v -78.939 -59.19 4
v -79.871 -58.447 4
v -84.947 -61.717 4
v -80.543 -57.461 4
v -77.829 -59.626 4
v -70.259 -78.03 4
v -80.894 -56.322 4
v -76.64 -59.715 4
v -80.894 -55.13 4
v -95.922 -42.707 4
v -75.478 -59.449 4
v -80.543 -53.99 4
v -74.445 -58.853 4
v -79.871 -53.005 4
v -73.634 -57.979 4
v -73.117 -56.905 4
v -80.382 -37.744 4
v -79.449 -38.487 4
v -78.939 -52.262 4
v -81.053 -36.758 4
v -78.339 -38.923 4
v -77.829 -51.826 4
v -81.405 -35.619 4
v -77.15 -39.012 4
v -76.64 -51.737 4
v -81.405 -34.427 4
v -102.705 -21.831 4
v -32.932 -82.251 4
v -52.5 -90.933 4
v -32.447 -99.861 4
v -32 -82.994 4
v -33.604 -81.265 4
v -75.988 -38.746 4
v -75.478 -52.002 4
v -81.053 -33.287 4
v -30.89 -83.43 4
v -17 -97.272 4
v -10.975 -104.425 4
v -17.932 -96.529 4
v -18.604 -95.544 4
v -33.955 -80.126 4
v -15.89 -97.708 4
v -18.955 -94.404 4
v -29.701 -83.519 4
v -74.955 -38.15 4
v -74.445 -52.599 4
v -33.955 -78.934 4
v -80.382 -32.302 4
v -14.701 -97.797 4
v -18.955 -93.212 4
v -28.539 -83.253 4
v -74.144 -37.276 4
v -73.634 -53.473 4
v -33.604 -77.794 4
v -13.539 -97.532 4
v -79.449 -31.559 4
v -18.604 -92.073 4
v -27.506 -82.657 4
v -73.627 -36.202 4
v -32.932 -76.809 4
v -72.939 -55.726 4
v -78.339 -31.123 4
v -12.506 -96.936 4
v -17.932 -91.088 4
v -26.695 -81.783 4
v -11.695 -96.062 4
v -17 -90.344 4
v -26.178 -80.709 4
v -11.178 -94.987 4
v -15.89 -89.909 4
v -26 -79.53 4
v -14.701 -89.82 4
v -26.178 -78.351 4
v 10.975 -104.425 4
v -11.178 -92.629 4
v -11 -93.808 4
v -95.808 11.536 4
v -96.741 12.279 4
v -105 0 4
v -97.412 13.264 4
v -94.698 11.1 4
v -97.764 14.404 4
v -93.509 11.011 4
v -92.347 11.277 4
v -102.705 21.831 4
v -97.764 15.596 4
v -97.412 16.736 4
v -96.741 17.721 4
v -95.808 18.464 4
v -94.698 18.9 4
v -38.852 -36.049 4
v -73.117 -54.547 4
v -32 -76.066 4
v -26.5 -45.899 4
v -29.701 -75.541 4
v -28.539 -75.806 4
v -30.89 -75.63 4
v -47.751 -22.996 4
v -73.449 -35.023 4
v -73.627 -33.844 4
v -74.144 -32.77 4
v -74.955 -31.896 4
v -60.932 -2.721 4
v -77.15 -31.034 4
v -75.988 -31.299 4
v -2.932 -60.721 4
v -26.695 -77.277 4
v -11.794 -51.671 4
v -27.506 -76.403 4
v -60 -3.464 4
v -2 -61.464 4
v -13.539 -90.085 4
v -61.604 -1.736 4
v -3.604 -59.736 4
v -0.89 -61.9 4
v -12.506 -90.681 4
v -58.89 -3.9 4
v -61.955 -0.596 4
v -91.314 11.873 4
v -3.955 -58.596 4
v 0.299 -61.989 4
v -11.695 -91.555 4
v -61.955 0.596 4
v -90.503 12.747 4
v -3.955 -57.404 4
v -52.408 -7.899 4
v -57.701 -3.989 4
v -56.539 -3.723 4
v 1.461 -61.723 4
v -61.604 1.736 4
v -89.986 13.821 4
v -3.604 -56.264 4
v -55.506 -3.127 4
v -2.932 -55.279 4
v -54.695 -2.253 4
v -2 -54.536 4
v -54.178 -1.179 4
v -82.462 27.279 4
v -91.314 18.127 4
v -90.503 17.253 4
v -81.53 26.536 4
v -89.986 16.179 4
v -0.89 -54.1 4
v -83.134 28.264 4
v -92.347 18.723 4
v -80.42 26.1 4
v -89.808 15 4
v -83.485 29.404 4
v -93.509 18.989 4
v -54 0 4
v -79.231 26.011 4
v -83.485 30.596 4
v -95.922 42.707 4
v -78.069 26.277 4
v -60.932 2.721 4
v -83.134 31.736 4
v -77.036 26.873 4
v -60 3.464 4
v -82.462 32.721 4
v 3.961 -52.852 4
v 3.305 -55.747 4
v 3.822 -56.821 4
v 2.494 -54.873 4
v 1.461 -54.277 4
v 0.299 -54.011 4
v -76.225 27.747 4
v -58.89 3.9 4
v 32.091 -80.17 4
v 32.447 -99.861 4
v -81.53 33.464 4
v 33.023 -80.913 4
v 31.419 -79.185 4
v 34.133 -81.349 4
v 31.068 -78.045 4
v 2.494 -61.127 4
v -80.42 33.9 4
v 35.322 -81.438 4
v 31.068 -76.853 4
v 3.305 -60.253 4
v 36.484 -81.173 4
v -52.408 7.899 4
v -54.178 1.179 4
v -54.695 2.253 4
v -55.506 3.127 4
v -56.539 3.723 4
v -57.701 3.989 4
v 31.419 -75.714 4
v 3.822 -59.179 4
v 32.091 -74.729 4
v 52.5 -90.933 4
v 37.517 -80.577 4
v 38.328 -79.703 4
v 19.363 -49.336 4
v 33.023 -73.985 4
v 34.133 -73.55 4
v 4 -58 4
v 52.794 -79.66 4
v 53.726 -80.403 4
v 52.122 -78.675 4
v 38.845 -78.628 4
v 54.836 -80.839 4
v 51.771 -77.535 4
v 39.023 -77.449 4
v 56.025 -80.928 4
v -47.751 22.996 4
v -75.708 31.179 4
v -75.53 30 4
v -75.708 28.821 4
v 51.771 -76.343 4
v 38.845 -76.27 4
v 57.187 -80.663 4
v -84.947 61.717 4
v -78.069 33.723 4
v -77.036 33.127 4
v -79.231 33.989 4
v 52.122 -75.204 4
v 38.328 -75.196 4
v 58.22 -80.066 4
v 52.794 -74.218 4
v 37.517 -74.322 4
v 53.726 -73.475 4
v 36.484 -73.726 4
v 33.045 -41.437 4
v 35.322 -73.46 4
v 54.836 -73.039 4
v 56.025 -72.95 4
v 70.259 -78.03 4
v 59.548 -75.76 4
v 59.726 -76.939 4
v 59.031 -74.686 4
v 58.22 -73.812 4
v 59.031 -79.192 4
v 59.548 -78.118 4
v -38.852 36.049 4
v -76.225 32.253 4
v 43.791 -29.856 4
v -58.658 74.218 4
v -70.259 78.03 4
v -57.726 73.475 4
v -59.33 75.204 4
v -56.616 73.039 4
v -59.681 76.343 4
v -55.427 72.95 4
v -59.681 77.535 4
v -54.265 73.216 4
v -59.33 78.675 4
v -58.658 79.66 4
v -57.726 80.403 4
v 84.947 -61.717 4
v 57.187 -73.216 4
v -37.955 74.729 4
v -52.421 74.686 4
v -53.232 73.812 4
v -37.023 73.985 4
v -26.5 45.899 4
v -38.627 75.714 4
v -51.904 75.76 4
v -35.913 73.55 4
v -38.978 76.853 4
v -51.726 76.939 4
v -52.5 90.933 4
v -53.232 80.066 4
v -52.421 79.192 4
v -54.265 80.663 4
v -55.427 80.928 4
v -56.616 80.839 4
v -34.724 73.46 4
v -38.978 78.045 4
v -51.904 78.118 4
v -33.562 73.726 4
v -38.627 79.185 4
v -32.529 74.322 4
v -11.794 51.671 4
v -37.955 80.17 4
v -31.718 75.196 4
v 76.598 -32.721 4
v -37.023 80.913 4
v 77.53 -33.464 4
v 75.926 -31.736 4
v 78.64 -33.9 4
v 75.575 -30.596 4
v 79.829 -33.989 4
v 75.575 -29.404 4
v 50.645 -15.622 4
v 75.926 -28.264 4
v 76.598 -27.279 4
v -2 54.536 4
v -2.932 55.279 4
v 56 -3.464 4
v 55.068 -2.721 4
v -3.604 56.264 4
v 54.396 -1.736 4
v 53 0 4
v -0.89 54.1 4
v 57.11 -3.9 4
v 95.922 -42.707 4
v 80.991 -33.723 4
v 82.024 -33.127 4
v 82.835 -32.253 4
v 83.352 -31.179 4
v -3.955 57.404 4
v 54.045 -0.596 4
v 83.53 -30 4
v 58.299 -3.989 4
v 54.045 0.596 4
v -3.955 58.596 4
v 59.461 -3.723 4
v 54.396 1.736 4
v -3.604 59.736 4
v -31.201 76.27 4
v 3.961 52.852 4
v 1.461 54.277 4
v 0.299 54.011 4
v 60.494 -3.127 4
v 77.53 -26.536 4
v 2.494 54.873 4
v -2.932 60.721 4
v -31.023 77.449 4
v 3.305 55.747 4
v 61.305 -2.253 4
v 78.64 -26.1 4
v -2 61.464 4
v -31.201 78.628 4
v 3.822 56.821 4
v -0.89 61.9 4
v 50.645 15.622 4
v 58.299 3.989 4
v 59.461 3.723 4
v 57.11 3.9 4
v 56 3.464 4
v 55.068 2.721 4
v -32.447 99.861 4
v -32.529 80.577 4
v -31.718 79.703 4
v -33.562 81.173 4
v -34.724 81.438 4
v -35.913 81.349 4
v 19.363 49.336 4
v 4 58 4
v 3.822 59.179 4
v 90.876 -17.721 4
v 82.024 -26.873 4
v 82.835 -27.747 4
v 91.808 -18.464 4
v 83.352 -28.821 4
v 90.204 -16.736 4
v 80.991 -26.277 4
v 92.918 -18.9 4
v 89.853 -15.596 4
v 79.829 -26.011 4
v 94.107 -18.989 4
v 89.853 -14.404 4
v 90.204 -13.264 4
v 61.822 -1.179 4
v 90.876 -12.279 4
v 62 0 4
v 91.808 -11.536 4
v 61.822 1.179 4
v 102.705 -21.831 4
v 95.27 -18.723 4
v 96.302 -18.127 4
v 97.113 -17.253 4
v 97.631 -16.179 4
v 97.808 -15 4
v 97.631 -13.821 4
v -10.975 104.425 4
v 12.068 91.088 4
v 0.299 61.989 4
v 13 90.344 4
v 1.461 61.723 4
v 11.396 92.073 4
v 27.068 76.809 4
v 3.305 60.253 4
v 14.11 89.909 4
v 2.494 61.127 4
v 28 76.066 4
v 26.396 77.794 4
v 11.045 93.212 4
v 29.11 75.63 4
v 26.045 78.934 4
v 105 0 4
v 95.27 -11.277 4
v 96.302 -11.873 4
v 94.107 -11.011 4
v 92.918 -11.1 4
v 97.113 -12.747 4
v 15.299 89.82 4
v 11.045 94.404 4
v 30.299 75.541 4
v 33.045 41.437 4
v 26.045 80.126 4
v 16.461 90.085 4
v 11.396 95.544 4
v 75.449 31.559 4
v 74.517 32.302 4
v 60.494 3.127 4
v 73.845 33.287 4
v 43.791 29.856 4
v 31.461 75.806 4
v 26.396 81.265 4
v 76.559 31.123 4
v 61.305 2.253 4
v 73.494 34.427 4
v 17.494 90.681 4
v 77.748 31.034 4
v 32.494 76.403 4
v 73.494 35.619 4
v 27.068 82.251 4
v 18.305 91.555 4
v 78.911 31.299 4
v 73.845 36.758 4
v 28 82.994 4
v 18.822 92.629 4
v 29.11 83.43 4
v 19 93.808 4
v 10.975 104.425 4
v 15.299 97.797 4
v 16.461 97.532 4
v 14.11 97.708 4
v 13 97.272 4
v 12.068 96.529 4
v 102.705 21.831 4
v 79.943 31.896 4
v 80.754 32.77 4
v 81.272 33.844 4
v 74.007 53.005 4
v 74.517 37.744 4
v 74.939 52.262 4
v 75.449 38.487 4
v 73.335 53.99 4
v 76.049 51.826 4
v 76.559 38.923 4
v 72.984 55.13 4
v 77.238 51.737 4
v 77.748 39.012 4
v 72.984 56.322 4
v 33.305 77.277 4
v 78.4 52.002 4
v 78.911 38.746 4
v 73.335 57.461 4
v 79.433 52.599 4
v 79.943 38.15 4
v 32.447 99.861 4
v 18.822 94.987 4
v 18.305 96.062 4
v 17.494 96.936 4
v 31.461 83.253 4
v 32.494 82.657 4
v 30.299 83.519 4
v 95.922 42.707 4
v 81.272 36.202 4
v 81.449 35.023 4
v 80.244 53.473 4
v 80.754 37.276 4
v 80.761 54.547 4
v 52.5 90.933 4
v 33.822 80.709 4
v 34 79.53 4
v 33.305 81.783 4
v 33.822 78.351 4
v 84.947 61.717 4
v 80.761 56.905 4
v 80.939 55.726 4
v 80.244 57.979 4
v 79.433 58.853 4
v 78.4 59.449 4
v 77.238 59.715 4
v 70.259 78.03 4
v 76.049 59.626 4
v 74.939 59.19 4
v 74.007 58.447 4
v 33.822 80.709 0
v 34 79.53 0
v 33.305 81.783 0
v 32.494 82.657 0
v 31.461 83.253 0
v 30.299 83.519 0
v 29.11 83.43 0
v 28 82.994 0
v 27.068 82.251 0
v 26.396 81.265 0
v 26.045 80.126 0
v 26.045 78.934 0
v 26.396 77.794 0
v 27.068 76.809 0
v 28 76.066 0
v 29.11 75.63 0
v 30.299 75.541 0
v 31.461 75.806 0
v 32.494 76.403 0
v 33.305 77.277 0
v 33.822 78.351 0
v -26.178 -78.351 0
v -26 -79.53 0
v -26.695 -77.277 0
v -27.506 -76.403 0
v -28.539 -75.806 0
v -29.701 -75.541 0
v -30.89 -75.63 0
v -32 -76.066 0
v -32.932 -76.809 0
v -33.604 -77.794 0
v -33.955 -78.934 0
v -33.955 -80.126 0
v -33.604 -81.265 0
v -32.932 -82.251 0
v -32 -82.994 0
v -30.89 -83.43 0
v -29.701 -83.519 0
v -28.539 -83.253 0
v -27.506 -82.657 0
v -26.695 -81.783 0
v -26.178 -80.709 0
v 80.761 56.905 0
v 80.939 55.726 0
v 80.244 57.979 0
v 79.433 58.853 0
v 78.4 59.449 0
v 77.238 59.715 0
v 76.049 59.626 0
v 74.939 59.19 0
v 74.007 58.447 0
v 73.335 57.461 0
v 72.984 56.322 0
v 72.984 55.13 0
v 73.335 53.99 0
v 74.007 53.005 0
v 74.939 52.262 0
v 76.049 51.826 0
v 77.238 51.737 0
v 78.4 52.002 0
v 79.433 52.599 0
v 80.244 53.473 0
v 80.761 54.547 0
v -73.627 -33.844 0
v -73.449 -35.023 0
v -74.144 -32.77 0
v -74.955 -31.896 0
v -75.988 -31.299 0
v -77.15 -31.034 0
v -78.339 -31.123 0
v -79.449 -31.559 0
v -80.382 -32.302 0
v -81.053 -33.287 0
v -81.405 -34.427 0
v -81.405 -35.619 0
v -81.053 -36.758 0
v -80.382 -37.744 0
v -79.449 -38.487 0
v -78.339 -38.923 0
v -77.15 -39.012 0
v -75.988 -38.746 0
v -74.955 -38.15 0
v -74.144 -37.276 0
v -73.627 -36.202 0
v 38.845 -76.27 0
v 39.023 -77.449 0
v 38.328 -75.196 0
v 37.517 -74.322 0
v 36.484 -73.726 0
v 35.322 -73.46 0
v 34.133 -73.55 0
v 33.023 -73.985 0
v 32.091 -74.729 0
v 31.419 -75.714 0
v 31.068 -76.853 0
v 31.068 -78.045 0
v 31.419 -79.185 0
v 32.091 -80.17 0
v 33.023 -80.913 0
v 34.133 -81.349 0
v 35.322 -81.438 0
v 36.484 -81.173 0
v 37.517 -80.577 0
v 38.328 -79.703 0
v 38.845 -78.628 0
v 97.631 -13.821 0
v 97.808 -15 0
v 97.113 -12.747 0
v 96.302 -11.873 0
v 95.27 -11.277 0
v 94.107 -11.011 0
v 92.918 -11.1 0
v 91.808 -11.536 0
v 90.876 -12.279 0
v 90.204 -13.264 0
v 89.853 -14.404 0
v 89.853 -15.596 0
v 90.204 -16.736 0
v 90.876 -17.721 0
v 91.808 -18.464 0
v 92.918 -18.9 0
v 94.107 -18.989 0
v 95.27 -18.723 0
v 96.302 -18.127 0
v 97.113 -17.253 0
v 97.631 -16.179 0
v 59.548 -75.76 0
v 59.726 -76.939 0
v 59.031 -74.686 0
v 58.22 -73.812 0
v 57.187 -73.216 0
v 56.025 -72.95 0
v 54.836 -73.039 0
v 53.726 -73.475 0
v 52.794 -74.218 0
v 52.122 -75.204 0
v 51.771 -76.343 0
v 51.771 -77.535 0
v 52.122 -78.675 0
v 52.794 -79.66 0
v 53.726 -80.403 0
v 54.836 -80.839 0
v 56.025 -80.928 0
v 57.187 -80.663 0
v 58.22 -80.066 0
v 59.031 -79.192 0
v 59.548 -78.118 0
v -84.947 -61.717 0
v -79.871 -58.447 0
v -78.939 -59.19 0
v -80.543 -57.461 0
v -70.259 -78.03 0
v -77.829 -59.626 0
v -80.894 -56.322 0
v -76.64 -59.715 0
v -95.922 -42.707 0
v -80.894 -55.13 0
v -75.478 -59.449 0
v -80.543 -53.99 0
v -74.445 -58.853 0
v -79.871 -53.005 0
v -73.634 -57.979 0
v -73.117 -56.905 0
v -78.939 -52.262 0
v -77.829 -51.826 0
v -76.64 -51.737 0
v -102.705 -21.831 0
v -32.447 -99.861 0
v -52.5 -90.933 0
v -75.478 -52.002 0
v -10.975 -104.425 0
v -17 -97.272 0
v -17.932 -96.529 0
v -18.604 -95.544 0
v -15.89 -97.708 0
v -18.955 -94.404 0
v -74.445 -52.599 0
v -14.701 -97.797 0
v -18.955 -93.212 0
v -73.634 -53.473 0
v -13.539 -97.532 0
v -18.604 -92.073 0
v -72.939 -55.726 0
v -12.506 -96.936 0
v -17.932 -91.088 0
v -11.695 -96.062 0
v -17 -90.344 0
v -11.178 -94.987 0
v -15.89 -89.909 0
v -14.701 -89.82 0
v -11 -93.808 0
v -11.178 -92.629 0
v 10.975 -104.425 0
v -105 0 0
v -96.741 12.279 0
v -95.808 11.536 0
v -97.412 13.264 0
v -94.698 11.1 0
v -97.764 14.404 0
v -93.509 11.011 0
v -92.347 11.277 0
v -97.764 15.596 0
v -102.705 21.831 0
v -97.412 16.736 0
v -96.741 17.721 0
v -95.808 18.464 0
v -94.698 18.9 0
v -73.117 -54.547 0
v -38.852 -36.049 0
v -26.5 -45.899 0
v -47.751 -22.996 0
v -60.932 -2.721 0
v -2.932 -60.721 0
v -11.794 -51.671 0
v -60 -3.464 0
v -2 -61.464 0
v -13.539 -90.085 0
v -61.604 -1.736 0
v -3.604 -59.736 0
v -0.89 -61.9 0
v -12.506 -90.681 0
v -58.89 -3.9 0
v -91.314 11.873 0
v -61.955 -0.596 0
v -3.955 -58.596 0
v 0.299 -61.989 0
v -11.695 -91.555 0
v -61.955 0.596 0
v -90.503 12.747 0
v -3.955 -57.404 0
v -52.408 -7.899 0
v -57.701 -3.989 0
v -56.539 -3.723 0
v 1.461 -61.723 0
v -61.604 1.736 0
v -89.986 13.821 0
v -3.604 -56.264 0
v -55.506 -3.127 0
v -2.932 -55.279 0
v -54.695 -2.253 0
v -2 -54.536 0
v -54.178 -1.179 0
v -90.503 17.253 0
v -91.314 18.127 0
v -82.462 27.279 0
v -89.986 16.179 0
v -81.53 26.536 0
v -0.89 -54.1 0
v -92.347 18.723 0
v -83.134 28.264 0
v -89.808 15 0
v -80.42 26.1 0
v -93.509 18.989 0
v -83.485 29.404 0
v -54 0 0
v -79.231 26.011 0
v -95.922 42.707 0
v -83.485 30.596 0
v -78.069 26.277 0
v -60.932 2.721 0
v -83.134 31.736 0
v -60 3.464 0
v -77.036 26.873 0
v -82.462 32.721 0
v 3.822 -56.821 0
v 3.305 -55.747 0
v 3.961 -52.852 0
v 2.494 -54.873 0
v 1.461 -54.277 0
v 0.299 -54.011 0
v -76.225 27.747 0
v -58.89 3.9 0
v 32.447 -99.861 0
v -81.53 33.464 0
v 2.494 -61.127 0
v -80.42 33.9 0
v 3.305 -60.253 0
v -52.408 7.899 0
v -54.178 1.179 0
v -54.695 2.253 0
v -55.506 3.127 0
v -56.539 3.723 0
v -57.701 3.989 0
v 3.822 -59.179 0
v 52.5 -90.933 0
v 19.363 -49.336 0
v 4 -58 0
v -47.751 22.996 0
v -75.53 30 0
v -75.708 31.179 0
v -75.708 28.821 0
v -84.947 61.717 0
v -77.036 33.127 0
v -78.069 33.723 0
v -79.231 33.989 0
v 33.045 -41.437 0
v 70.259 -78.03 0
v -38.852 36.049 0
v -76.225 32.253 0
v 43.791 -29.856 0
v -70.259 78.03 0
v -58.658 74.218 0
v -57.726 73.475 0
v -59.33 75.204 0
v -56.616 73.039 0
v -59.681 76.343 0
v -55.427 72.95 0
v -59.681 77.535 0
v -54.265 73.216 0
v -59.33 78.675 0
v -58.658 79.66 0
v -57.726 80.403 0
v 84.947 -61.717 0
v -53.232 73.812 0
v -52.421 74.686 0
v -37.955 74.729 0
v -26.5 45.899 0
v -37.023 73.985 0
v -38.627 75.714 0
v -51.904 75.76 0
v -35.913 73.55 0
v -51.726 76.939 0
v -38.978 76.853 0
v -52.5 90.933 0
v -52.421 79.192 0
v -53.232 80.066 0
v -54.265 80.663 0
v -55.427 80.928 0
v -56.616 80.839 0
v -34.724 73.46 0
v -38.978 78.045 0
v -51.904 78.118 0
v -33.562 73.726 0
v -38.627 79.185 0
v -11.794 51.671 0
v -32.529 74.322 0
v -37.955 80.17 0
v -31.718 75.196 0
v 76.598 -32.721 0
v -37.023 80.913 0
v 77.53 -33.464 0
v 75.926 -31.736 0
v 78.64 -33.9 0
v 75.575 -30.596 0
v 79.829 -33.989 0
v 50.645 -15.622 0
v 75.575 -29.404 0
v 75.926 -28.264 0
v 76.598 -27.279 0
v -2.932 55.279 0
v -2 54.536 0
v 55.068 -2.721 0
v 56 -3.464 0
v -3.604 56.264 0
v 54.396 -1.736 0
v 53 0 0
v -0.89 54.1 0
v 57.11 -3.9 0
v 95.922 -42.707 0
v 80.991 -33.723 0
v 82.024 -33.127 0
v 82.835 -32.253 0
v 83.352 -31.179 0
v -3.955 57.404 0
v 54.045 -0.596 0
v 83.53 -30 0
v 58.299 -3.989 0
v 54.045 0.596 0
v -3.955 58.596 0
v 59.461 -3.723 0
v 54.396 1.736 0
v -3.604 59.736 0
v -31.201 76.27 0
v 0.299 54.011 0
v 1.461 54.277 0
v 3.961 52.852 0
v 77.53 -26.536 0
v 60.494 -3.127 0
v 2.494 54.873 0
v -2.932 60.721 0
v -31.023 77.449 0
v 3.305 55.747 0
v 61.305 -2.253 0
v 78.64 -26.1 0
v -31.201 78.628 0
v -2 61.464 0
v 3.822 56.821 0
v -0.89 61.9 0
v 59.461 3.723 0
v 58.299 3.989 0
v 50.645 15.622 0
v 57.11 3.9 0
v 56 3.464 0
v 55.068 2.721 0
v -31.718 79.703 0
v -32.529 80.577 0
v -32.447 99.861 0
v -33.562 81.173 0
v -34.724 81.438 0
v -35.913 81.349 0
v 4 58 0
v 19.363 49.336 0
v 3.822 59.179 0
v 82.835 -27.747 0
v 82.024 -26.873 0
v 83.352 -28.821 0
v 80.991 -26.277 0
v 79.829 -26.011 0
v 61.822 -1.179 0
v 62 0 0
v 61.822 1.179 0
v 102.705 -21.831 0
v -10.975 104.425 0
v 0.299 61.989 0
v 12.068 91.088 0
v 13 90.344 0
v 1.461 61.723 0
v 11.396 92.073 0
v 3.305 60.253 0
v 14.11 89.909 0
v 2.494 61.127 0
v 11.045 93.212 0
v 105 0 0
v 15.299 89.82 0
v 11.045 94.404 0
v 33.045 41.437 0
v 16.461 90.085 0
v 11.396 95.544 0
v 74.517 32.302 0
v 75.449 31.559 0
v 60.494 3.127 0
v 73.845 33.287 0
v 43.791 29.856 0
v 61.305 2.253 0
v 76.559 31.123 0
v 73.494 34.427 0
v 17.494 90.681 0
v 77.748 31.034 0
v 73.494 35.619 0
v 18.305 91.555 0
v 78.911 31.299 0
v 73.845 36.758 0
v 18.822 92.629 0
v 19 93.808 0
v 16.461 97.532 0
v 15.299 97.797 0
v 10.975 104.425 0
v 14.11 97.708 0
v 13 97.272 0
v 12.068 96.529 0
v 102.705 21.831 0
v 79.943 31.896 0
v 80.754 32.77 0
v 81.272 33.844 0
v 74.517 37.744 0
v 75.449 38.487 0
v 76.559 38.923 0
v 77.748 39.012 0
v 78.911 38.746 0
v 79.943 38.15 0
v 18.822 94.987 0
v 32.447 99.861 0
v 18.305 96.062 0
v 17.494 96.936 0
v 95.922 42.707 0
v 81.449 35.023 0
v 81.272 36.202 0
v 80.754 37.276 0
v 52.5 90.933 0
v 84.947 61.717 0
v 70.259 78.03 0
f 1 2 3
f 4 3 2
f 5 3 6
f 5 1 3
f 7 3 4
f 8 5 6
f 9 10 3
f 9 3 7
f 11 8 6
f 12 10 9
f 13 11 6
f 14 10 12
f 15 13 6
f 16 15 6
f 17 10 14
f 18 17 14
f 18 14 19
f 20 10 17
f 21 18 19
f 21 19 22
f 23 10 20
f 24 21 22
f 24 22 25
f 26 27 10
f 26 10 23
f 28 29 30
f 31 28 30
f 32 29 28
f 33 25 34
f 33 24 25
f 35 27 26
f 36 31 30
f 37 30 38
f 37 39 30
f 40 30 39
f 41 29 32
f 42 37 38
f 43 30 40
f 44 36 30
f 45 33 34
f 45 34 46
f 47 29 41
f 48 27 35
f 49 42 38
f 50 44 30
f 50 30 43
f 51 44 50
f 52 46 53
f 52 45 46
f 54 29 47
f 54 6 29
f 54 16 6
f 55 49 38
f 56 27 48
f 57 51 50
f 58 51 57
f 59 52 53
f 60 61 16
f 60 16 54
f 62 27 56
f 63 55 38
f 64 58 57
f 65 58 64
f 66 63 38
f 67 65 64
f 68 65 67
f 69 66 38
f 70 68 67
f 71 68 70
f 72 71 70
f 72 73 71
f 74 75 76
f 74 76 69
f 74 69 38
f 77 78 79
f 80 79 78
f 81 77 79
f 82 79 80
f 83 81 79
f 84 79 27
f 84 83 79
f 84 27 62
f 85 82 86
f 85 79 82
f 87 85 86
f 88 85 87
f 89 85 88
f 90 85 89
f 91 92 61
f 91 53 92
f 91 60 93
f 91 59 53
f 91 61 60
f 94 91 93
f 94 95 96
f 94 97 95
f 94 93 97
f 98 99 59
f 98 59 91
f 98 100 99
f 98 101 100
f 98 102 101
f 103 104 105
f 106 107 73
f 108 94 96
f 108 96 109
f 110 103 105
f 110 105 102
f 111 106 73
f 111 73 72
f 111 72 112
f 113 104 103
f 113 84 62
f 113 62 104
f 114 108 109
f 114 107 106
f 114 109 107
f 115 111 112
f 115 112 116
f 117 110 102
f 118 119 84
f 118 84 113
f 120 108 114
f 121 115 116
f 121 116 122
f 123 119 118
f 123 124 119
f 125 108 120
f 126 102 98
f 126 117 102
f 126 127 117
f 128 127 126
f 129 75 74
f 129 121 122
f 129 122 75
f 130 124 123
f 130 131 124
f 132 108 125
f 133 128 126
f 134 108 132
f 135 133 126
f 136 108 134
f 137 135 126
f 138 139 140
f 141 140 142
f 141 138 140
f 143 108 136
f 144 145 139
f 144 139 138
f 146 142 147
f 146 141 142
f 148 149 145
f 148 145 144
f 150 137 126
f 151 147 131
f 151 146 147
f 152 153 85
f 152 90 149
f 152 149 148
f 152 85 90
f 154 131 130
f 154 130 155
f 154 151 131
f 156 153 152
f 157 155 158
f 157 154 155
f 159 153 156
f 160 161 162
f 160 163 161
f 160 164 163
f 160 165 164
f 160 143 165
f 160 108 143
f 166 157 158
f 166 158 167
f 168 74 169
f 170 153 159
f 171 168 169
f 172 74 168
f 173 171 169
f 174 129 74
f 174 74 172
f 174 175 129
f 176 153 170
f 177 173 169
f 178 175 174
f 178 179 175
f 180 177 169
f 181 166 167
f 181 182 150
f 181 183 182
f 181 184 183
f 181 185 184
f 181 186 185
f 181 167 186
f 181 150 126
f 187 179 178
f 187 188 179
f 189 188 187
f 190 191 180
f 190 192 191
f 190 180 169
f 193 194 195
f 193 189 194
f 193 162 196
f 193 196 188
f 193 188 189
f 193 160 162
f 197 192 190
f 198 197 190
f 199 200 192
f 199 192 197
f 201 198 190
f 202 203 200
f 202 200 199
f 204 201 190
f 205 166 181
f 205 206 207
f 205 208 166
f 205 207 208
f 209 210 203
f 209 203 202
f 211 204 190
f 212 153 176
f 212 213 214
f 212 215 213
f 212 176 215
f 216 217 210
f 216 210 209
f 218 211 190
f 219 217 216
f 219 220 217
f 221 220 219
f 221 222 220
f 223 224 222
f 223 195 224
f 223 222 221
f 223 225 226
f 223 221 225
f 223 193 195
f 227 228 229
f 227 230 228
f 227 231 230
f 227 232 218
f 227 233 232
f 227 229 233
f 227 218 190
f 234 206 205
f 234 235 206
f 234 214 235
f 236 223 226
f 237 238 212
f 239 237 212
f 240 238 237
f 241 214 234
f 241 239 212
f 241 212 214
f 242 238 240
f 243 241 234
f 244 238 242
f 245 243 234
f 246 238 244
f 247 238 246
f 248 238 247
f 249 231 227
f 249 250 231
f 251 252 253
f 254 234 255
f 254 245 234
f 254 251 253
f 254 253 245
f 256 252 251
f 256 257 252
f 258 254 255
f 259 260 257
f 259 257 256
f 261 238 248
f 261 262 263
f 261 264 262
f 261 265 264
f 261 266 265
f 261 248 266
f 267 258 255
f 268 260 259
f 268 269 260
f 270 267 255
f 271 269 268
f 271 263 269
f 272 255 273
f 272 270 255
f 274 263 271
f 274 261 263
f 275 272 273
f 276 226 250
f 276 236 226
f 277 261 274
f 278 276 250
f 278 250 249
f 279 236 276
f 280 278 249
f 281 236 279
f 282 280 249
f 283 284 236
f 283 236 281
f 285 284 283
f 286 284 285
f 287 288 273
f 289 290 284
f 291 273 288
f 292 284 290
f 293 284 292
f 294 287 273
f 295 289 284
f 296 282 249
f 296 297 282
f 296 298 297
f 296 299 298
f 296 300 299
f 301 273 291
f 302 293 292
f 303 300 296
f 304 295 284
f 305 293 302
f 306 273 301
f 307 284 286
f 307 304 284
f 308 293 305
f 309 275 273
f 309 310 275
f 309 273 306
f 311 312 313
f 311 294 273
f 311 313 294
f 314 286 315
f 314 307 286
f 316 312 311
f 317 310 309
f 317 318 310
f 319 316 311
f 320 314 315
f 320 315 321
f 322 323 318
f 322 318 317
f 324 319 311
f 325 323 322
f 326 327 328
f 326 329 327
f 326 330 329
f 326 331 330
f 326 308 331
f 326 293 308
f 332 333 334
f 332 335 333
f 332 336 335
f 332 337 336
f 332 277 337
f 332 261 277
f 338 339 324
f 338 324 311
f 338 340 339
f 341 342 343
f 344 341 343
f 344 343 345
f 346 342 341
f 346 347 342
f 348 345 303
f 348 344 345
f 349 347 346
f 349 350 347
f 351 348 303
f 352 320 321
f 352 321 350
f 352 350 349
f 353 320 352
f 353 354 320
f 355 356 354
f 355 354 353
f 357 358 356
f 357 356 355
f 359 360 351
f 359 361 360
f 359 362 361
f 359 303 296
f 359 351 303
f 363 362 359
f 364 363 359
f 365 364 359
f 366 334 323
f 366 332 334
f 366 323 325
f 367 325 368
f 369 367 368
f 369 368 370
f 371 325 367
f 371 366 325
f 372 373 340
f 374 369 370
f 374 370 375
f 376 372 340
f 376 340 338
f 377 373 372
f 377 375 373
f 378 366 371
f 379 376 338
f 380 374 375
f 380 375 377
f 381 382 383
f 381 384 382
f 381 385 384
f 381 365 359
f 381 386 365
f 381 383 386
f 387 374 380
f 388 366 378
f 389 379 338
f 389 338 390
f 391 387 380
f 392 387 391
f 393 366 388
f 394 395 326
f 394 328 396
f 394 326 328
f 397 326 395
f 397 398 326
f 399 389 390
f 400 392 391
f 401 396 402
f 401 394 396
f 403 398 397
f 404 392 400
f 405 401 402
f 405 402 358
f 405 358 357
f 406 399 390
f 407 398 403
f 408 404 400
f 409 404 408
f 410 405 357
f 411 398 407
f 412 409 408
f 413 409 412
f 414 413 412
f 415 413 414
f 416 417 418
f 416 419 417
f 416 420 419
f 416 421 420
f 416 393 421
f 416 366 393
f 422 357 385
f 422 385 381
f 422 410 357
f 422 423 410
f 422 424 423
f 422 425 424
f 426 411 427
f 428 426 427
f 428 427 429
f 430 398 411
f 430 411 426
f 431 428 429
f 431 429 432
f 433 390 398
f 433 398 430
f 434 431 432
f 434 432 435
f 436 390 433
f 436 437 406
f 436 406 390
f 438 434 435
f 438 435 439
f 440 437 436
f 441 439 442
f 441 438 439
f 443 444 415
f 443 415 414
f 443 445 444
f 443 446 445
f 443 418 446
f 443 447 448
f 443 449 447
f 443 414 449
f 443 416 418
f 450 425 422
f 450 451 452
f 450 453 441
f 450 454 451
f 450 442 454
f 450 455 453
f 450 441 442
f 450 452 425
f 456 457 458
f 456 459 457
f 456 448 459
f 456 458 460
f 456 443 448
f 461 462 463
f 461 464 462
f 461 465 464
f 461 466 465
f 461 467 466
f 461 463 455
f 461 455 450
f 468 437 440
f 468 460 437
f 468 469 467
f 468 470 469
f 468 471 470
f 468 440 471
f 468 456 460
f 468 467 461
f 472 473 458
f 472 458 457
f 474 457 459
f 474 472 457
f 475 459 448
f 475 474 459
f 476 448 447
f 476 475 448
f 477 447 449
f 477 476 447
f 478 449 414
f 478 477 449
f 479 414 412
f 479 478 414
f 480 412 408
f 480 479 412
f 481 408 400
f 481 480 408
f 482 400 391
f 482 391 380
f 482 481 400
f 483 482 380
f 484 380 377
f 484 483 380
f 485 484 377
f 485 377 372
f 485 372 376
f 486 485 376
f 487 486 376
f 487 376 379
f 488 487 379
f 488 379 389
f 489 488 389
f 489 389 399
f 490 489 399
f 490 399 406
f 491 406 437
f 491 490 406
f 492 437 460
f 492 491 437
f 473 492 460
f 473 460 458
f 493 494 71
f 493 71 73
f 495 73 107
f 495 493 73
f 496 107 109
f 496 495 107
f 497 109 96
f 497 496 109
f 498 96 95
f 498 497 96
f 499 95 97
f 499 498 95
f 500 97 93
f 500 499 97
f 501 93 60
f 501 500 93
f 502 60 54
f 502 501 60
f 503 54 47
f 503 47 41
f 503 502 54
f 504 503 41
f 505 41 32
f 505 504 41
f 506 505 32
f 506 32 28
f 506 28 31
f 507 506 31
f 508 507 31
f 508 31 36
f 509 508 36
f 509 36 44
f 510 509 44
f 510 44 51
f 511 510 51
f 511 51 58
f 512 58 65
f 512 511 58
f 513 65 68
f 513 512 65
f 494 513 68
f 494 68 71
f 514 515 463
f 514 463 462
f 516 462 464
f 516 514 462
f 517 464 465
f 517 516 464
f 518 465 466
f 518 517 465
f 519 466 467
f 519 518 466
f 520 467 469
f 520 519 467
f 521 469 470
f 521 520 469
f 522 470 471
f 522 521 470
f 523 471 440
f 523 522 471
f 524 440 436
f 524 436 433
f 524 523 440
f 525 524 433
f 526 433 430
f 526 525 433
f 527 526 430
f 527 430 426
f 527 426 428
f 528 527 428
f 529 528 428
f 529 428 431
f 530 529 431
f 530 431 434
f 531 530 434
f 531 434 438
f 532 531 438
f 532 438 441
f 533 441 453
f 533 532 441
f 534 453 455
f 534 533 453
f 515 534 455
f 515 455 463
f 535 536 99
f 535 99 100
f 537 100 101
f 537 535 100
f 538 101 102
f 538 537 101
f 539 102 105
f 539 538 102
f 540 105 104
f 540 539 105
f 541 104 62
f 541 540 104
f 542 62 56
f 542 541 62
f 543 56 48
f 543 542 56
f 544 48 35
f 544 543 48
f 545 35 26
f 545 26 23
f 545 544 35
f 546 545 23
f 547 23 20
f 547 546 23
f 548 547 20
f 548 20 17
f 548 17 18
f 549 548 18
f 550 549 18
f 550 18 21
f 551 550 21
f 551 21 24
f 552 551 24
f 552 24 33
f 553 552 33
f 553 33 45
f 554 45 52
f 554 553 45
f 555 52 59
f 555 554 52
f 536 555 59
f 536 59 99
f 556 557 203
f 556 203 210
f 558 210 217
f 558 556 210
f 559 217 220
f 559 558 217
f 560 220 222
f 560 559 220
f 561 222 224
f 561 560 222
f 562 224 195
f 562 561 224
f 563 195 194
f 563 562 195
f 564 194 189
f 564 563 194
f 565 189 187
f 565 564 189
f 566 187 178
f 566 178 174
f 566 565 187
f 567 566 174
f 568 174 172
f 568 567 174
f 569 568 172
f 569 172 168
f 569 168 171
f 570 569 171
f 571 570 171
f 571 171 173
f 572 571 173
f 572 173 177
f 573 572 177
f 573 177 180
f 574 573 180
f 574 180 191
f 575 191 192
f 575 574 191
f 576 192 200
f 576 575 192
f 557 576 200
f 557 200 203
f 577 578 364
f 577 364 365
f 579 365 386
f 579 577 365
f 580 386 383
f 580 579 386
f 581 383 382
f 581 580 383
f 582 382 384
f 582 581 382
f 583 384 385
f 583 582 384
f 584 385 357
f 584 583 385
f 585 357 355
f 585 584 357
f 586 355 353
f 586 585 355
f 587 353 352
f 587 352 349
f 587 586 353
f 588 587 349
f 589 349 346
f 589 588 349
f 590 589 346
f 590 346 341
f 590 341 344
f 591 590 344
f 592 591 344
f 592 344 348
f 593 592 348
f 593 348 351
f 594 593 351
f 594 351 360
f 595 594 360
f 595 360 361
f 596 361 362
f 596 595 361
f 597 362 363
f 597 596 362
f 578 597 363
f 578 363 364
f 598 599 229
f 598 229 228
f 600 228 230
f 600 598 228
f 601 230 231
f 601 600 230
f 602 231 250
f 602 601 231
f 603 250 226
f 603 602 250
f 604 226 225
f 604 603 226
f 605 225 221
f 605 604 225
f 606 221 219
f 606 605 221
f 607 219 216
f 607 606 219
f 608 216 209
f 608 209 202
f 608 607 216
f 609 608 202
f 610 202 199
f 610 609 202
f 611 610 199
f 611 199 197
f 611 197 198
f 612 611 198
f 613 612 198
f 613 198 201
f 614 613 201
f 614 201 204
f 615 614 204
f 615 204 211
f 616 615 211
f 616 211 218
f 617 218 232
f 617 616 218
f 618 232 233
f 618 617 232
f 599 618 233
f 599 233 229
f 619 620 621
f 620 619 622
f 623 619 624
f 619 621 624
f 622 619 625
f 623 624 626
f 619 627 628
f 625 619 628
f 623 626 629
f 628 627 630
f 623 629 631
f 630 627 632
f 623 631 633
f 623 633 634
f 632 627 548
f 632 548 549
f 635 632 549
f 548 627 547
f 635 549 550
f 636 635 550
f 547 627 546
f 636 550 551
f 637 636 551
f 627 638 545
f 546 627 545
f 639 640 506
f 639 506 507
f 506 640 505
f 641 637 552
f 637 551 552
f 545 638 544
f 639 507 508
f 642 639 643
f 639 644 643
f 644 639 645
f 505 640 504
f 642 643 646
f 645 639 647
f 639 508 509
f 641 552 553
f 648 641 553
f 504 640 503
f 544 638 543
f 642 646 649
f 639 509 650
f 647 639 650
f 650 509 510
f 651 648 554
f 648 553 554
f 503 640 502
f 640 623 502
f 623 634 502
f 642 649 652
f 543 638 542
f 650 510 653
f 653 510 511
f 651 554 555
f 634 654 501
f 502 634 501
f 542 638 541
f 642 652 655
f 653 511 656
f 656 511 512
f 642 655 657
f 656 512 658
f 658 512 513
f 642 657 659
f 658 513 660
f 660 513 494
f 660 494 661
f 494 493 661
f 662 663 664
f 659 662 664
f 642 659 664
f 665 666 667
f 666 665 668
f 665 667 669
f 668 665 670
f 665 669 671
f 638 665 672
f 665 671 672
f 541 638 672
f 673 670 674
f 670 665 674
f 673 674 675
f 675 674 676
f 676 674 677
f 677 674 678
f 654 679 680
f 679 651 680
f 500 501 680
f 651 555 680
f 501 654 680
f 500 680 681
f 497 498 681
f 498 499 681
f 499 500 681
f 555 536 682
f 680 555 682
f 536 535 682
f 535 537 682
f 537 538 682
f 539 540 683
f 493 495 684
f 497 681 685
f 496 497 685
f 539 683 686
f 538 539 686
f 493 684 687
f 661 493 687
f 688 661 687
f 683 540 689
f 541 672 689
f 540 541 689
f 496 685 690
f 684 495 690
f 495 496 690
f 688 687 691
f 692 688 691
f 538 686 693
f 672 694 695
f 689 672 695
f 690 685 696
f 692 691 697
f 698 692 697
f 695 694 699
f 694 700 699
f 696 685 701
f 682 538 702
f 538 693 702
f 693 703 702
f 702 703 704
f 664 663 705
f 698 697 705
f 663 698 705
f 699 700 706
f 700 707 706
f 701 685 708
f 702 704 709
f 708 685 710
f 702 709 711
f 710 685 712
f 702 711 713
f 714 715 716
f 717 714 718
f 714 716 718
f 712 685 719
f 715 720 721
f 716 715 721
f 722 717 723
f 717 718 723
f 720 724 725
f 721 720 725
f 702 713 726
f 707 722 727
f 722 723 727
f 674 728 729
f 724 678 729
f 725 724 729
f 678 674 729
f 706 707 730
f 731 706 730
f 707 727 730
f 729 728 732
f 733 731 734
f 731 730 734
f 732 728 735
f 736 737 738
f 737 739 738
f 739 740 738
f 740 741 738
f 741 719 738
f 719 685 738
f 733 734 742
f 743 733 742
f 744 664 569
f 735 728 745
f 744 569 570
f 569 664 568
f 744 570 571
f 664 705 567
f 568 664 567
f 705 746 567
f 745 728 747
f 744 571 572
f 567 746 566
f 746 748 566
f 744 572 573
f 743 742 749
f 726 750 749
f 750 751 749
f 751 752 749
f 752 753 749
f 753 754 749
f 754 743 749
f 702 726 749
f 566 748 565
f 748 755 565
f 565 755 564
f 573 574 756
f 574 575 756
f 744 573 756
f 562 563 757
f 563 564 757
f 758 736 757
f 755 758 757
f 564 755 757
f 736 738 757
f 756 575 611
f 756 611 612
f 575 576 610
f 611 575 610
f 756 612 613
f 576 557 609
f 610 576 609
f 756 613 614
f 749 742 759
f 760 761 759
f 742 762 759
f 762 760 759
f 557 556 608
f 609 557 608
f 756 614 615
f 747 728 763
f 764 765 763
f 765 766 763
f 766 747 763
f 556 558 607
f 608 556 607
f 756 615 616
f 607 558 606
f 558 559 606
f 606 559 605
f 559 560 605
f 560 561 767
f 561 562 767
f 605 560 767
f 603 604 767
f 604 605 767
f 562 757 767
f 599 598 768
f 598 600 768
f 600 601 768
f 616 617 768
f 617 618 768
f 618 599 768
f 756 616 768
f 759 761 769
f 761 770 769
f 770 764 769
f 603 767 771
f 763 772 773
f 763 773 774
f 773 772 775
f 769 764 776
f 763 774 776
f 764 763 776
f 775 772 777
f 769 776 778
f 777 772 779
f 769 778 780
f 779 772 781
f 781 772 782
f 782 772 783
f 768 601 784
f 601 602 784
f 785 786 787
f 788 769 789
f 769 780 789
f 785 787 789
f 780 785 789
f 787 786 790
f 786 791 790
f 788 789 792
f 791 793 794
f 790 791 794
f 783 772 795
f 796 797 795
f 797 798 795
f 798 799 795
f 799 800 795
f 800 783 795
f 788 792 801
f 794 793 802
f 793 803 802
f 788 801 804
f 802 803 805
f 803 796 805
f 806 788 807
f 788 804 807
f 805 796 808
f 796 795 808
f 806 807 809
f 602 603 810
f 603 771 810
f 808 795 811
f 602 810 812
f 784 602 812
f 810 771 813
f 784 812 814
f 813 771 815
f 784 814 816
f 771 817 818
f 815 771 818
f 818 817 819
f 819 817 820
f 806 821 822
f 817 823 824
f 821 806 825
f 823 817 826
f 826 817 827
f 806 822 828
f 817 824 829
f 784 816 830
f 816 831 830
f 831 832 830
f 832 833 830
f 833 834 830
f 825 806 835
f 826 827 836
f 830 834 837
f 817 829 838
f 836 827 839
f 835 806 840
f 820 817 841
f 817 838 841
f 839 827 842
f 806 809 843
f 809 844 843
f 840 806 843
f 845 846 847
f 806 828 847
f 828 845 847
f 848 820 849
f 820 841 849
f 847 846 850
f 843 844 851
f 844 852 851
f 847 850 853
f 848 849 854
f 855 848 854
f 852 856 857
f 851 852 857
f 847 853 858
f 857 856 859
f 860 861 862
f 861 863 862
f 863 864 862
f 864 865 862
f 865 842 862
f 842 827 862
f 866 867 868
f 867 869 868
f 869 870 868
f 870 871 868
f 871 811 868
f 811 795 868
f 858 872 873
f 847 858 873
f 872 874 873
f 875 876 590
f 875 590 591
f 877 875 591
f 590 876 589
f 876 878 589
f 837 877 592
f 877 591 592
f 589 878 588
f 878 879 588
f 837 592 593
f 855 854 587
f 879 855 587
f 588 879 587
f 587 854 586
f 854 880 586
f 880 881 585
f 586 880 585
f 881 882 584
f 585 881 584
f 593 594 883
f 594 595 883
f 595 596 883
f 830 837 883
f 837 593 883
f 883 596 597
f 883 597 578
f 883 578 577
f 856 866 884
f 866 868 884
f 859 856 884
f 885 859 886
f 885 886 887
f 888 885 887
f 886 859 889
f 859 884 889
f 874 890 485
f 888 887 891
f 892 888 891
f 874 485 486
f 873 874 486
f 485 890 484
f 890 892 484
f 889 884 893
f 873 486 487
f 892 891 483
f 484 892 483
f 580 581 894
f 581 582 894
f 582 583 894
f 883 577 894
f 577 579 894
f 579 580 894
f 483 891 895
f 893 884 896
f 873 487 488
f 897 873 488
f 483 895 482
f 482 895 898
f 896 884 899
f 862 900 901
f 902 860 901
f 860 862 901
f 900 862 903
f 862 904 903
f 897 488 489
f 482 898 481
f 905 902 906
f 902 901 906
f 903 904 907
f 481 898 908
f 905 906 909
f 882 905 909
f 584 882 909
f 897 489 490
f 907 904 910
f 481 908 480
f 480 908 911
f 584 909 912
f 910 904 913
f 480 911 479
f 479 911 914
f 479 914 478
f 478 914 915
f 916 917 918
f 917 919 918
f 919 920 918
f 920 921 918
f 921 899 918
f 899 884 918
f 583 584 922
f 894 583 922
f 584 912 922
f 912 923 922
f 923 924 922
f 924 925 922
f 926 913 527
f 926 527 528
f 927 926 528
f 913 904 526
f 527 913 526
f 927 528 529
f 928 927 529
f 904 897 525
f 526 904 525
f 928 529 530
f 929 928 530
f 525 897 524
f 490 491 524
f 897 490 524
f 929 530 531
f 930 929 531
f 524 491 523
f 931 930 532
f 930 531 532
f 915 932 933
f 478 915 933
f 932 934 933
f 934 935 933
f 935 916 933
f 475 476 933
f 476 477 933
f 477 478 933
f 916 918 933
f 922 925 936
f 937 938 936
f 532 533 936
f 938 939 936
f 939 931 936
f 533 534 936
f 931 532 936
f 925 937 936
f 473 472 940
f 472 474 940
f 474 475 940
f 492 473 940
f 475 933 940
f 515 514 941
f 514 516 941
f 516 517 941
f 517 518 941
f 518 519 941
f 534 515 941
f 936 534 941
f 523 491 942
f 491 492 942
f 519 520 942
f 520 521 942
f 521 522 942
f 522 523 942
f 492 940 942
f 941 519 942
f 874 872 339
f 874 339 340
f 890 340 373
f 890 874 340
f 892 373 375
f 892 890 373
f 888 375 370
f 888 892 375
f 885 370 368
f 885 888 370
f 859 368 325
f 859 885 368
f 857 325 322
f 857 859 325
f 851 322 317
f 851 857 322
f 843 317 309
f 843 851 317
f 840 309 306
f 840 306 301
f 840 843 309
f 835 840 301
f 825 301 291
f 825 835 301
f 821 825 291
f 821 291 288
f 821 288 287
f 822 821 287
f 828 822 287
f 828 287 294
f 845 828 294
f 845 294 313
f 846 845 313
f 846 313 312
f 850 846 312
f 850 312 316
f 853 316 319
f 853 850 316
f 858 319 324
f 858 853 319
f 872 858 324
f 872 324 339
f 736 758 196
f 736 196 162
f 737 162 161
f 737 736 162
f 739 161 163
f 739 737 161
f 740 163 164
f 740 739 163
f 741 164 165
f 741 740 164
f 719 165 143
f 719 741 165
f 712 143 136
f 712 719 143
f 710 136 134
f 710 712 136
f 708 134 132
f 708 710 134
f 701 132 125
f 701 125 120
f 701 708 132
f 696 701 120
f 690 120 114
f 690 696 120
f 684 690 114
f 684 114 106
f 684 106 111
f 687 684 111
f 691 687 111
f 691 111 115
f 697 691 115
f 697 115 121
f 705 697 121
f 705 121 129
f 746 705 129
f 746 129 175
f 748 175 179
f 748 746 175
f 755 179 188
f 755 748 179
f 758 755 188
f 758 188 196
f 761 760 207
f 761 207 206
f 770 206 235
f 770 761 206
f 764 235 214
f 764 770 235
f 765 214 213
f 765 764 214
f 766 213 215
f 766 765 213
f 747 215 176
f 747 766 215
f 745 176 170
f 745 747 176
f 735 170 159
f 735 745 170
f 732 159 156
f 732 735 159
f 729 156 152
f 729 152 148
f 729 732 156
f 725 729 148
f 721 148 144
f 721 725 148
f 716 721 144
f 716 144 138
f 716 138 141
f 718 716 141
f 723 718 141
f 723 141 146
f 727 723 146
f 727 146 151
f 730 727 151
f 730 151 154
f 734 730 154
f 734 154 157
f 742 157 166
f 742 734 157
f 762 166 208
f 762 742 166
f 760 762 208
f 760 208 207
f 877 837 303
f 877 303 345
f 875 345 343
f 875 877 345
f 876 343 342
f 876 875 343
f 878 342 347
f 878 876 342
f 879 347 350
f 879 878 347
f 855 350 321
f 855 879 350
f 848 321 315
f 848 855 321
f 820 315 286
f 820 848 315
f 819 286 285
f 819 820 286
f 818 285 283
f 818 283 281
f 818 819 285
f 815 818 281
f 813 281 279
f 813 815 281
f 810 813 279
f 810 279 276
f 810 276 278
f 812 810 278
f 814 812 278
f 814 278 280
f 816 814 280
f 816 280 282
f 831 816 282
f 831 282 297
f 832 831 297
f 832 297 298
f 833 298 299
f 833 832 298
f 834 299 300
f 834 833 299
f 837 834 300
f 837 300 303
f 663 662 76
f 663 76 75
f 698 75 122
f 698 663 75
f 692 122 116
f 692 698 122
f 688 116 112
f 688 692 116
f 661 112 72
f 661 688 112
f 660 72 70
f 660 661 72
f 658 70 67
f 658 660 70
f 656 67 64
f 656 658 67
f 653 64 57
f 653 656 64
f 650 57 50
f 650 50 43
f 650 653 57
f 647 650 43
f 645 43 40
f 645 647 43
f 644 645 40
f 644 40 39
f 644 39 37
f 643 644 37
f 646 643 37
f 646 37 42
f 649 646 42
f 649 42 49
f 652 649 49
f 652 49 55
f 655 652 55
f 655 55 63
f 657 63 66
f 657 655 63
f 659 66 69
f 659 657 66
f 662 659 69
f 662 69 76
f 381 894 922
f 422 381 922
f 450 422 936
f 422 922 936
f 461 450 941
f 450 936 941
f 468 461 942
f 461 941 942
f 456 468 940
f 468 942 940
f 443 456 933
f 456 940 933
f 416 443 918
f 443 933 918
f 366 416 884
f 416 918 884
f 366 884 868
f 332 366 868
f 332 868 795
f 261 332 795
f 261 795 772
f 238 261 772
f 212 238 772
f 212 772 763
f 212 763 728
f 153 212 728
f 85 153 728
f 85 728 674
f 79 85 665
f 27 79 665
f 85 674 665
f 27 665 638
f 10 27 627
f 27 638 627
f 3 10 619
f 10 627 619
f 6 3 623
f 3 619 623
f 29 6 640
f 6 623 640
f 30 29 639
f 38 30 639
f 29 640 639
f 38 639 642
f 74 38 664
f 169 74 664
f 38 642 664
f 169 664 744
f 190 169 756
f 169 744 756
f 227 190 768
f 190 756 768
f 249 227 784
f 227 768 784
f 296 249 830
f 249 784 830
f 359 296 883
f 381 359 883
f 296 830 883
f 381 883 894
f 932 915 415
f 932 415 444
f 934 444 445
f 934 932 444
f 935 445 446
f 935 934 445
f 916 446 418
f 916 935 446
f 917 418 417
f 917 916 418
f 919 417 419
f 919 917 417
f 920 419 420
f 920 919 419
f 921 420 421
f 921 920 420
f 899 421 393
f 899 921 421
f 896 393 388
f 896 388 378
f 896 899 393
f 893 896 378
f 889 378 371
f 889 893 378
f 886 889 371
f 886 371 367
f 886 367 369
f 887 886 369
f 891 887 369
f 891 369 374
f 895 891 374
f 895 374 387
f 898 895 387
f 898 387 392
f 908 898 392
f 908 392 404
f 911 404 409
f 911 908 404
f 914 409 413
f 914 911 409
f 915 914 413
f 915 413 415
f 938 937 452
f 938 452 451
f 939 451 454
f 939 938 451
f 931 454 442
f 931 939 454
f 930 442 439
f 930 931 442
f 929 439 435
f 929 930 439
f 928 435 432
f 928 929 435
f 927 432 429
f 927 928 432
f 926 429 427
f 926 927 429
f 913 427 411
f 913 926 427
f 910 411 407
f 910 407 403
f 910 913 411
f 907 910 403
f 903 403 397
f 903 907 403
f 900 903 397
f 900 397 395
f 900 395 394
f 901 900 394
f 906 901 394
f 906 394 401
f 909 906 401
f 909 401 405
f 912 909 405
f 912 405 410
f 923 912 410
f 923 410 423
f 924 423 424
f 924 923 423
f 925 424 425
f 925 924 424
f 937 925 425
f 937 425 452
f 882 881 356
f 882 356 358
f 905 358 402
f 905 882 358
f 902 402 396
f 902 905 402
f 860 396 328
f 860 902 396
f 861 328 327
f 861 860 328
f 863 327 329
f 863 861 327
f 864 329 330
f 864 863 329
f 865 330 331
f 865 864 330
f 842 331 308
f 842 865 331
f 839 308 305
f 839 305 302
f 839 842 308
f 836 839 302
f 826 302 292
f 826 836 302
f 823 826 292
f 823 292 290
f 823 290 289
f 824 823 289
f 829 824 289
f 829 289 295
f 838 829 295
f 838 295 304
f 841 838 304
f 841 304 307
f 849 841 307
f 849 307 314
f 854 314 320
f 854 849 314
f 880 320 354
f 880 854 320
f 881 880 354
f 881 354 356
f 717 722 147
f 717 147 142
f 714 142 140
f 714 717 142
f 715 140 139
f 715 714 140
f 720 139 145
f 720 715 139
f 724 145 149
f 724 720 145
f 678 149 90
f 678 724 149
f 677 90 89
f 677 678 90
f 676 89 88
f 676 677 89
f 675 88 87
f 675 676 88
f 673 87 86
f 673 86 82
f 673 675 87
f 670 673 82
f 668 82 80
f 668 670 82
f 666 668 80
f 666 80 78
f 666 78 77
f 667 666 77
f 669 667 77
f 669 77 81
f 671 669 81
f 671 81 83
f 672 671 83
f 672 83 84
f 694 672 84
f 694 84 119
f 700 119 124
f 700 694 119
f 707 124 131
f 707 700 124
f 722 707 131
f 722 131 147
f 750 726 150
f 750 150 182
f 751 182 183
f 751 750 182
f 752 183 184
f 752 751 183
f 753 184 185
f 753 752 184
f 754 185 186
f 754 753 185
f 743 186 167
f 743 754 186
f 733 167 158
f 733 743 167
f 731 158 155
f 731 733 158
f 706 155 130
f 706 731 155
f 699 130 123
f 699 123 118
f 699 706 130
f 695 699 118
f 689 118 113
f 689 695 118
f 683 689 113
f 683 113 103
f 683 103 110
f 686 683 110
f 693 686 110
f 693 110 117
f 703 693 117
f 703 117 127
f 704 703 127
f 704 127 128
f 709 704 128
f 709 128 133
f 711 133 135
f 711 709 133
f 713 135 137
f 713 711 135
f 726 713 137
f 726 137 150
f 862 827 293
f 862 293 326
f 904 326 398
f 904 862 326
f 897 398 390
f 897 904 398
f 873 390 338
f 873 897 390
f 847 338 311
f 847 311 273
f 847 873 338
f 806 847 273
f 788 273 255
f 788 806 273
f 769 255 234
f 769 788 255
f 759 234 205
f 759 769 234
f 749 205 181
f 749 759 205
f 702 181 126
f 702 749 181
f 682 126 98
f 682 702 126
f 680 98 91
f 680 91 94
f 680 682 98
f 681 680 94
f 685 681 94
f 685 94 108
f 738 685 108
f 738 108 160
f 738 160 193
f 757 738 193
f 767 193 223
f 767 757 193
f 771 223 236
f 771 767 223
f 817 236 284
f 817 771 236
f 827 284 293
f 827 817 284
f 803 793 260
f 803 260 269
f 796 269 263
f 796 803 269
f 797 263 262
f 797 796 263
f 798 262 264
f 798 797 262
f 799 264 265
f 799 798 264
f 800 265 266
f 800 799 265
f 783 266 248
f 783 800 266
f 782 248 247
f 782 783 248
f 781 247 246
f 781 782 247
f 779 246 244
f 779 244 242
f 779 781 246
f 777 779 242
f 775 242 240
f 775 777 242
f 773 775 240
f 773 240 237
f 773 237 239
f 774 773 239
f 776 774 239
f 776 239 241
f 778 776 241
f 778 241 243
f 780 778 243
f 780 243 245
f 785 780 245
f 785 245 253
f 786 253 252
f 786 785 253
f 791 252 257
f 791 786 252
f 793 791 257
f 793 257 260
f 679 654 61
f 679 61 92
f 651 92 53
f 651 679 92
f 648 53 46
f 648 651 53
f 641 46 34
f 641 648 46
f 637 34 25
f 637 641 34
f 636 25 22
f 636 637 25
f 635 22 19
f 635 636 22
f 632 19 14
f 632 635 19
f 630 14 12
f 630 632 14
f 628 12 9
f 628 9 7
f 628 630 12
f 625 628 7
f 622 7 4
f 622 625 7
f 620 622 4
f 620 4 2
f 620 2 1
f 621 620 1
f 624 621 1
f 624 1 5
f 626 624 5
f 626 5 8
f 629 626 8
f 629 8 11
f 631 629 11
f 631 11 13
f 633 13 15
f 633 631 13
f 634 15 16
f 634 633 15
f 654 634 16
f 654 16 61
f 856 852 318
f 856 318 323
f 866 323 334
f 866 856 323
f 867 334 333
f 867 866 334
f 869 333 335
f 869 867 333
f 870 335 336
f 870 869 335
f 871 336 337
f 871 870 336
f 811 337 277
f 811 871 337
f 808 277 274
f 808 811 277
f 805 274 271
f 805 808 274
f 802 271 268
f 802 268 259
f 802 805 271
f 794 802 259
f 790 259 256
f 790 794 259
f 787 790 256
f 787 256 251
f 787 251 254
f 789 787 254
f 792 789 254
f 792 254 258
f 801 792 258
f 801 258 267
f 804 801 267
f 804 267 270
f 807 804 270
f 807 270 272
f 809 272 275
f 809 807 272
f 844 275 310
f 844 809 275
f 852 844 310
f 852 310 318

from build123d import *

# Parameters (mm, degrees)
SKETCH1_R           = 105
SKETCH1_R_2         = 53
SKETCH1_R_3         = 4
BOSS_EXTRUDE1_DEPTH = 4


with BuildPart() as part:
    # Sketch1 → Boss-Extrude1 (new body)
    with BuildSketch(Plane.XY):
        Circle(SKETCH1_R)
        Circle(SKETCH1_R_2, mode=Mode.SUBTRACT)
        with Locations((0, 58)):
            Circle(SKETCH1_R_3, mode=Mode.SUBTRACT)
        with Locations((30, 79.529868603)):
            Circle(SKETCH1_R_3, mode=Mode.SUBTRACT)
        with Locations((15, 93.808315196)):
            Circle(SKETCH1_R_3, mode=Mode.SUBTRACT)
        with Locations((58, 0)):
            Circle(SKETCH1_R_3, mode=Mode.SUBTRACT)
        with Locations((0, -58)):
            Circle(SKETCH1_R_3, mode=Mode.SUBTRACT)
        with Locations((-58, 0)):
            Circle(SKETCH1_R_3, mode=Mode.SUBTRACT)
        with Locations((77.449312832, 35.02290596)):
            Circle(SKETCH1_R_3, mode=Mode.SUBTRACT)
        with Locations((79.529868603, -30)):
            Circle(SKETCH1_R_3, mode=Mode.SUBTRACT)
        with Locations((35.02290596, -77.449312832)):
            Circle(SKETCH1_R_3, mode=Mode.SUBTRACT)
        with Locations((-30, -79.529868603)):
            Circle(SKETCH1_R_3, mode=Mode.SUBTRACT)
        with Locations((-77.449312832, -35.02290596)):
            Circle(SKETCH1_R_3, mode=Mode.SUBTRACT)
        with Locations((-79.529868603, 30)):
            Circle(SKETCH1_R_3, mode=Mode.SUBTRACT)
        with Locations((-35.02290596, 77.449312832)):
            Circle(SKETCH1_R_3, mode=Mode.SUBTRACT)
        with Locations((76.939097525, 55.725894089)):
            Circle(SKETCH1_R_3, mode=Mode.SUBTRACT)
        with Locations((93.808315196, -15)):
            Circle(SKETCH1_R_3, mode=Mode.SUBTRACT)
        with Locations((55.725894089, -76.939097525)):
            Circle(SKETCH1_R_3, mode=Mode.SUBTRACT)
        with Locations((-15, -93.808315196)):
            Circle(SKETCH1_R_3, mode=Mode.SUBTRACT)
        with Locations((-76.939097525, -55.725894089)):
            Circle(SKETCH1_R_3, mode=Mode.SUBTRACT)
        with Locations((-93.808315196, 15)):
            Circle(SKETCH1_R_3, mode=Mode.SUBTRACT)
        with Locations((-55.725894089, 76.939097525)):
            Circle(SKETCH1_R_3, mode=Mode.SUBTRACT)
    extrude(amount=BOSS_EXTRUDE1_DEPTH)


solid = part.part
